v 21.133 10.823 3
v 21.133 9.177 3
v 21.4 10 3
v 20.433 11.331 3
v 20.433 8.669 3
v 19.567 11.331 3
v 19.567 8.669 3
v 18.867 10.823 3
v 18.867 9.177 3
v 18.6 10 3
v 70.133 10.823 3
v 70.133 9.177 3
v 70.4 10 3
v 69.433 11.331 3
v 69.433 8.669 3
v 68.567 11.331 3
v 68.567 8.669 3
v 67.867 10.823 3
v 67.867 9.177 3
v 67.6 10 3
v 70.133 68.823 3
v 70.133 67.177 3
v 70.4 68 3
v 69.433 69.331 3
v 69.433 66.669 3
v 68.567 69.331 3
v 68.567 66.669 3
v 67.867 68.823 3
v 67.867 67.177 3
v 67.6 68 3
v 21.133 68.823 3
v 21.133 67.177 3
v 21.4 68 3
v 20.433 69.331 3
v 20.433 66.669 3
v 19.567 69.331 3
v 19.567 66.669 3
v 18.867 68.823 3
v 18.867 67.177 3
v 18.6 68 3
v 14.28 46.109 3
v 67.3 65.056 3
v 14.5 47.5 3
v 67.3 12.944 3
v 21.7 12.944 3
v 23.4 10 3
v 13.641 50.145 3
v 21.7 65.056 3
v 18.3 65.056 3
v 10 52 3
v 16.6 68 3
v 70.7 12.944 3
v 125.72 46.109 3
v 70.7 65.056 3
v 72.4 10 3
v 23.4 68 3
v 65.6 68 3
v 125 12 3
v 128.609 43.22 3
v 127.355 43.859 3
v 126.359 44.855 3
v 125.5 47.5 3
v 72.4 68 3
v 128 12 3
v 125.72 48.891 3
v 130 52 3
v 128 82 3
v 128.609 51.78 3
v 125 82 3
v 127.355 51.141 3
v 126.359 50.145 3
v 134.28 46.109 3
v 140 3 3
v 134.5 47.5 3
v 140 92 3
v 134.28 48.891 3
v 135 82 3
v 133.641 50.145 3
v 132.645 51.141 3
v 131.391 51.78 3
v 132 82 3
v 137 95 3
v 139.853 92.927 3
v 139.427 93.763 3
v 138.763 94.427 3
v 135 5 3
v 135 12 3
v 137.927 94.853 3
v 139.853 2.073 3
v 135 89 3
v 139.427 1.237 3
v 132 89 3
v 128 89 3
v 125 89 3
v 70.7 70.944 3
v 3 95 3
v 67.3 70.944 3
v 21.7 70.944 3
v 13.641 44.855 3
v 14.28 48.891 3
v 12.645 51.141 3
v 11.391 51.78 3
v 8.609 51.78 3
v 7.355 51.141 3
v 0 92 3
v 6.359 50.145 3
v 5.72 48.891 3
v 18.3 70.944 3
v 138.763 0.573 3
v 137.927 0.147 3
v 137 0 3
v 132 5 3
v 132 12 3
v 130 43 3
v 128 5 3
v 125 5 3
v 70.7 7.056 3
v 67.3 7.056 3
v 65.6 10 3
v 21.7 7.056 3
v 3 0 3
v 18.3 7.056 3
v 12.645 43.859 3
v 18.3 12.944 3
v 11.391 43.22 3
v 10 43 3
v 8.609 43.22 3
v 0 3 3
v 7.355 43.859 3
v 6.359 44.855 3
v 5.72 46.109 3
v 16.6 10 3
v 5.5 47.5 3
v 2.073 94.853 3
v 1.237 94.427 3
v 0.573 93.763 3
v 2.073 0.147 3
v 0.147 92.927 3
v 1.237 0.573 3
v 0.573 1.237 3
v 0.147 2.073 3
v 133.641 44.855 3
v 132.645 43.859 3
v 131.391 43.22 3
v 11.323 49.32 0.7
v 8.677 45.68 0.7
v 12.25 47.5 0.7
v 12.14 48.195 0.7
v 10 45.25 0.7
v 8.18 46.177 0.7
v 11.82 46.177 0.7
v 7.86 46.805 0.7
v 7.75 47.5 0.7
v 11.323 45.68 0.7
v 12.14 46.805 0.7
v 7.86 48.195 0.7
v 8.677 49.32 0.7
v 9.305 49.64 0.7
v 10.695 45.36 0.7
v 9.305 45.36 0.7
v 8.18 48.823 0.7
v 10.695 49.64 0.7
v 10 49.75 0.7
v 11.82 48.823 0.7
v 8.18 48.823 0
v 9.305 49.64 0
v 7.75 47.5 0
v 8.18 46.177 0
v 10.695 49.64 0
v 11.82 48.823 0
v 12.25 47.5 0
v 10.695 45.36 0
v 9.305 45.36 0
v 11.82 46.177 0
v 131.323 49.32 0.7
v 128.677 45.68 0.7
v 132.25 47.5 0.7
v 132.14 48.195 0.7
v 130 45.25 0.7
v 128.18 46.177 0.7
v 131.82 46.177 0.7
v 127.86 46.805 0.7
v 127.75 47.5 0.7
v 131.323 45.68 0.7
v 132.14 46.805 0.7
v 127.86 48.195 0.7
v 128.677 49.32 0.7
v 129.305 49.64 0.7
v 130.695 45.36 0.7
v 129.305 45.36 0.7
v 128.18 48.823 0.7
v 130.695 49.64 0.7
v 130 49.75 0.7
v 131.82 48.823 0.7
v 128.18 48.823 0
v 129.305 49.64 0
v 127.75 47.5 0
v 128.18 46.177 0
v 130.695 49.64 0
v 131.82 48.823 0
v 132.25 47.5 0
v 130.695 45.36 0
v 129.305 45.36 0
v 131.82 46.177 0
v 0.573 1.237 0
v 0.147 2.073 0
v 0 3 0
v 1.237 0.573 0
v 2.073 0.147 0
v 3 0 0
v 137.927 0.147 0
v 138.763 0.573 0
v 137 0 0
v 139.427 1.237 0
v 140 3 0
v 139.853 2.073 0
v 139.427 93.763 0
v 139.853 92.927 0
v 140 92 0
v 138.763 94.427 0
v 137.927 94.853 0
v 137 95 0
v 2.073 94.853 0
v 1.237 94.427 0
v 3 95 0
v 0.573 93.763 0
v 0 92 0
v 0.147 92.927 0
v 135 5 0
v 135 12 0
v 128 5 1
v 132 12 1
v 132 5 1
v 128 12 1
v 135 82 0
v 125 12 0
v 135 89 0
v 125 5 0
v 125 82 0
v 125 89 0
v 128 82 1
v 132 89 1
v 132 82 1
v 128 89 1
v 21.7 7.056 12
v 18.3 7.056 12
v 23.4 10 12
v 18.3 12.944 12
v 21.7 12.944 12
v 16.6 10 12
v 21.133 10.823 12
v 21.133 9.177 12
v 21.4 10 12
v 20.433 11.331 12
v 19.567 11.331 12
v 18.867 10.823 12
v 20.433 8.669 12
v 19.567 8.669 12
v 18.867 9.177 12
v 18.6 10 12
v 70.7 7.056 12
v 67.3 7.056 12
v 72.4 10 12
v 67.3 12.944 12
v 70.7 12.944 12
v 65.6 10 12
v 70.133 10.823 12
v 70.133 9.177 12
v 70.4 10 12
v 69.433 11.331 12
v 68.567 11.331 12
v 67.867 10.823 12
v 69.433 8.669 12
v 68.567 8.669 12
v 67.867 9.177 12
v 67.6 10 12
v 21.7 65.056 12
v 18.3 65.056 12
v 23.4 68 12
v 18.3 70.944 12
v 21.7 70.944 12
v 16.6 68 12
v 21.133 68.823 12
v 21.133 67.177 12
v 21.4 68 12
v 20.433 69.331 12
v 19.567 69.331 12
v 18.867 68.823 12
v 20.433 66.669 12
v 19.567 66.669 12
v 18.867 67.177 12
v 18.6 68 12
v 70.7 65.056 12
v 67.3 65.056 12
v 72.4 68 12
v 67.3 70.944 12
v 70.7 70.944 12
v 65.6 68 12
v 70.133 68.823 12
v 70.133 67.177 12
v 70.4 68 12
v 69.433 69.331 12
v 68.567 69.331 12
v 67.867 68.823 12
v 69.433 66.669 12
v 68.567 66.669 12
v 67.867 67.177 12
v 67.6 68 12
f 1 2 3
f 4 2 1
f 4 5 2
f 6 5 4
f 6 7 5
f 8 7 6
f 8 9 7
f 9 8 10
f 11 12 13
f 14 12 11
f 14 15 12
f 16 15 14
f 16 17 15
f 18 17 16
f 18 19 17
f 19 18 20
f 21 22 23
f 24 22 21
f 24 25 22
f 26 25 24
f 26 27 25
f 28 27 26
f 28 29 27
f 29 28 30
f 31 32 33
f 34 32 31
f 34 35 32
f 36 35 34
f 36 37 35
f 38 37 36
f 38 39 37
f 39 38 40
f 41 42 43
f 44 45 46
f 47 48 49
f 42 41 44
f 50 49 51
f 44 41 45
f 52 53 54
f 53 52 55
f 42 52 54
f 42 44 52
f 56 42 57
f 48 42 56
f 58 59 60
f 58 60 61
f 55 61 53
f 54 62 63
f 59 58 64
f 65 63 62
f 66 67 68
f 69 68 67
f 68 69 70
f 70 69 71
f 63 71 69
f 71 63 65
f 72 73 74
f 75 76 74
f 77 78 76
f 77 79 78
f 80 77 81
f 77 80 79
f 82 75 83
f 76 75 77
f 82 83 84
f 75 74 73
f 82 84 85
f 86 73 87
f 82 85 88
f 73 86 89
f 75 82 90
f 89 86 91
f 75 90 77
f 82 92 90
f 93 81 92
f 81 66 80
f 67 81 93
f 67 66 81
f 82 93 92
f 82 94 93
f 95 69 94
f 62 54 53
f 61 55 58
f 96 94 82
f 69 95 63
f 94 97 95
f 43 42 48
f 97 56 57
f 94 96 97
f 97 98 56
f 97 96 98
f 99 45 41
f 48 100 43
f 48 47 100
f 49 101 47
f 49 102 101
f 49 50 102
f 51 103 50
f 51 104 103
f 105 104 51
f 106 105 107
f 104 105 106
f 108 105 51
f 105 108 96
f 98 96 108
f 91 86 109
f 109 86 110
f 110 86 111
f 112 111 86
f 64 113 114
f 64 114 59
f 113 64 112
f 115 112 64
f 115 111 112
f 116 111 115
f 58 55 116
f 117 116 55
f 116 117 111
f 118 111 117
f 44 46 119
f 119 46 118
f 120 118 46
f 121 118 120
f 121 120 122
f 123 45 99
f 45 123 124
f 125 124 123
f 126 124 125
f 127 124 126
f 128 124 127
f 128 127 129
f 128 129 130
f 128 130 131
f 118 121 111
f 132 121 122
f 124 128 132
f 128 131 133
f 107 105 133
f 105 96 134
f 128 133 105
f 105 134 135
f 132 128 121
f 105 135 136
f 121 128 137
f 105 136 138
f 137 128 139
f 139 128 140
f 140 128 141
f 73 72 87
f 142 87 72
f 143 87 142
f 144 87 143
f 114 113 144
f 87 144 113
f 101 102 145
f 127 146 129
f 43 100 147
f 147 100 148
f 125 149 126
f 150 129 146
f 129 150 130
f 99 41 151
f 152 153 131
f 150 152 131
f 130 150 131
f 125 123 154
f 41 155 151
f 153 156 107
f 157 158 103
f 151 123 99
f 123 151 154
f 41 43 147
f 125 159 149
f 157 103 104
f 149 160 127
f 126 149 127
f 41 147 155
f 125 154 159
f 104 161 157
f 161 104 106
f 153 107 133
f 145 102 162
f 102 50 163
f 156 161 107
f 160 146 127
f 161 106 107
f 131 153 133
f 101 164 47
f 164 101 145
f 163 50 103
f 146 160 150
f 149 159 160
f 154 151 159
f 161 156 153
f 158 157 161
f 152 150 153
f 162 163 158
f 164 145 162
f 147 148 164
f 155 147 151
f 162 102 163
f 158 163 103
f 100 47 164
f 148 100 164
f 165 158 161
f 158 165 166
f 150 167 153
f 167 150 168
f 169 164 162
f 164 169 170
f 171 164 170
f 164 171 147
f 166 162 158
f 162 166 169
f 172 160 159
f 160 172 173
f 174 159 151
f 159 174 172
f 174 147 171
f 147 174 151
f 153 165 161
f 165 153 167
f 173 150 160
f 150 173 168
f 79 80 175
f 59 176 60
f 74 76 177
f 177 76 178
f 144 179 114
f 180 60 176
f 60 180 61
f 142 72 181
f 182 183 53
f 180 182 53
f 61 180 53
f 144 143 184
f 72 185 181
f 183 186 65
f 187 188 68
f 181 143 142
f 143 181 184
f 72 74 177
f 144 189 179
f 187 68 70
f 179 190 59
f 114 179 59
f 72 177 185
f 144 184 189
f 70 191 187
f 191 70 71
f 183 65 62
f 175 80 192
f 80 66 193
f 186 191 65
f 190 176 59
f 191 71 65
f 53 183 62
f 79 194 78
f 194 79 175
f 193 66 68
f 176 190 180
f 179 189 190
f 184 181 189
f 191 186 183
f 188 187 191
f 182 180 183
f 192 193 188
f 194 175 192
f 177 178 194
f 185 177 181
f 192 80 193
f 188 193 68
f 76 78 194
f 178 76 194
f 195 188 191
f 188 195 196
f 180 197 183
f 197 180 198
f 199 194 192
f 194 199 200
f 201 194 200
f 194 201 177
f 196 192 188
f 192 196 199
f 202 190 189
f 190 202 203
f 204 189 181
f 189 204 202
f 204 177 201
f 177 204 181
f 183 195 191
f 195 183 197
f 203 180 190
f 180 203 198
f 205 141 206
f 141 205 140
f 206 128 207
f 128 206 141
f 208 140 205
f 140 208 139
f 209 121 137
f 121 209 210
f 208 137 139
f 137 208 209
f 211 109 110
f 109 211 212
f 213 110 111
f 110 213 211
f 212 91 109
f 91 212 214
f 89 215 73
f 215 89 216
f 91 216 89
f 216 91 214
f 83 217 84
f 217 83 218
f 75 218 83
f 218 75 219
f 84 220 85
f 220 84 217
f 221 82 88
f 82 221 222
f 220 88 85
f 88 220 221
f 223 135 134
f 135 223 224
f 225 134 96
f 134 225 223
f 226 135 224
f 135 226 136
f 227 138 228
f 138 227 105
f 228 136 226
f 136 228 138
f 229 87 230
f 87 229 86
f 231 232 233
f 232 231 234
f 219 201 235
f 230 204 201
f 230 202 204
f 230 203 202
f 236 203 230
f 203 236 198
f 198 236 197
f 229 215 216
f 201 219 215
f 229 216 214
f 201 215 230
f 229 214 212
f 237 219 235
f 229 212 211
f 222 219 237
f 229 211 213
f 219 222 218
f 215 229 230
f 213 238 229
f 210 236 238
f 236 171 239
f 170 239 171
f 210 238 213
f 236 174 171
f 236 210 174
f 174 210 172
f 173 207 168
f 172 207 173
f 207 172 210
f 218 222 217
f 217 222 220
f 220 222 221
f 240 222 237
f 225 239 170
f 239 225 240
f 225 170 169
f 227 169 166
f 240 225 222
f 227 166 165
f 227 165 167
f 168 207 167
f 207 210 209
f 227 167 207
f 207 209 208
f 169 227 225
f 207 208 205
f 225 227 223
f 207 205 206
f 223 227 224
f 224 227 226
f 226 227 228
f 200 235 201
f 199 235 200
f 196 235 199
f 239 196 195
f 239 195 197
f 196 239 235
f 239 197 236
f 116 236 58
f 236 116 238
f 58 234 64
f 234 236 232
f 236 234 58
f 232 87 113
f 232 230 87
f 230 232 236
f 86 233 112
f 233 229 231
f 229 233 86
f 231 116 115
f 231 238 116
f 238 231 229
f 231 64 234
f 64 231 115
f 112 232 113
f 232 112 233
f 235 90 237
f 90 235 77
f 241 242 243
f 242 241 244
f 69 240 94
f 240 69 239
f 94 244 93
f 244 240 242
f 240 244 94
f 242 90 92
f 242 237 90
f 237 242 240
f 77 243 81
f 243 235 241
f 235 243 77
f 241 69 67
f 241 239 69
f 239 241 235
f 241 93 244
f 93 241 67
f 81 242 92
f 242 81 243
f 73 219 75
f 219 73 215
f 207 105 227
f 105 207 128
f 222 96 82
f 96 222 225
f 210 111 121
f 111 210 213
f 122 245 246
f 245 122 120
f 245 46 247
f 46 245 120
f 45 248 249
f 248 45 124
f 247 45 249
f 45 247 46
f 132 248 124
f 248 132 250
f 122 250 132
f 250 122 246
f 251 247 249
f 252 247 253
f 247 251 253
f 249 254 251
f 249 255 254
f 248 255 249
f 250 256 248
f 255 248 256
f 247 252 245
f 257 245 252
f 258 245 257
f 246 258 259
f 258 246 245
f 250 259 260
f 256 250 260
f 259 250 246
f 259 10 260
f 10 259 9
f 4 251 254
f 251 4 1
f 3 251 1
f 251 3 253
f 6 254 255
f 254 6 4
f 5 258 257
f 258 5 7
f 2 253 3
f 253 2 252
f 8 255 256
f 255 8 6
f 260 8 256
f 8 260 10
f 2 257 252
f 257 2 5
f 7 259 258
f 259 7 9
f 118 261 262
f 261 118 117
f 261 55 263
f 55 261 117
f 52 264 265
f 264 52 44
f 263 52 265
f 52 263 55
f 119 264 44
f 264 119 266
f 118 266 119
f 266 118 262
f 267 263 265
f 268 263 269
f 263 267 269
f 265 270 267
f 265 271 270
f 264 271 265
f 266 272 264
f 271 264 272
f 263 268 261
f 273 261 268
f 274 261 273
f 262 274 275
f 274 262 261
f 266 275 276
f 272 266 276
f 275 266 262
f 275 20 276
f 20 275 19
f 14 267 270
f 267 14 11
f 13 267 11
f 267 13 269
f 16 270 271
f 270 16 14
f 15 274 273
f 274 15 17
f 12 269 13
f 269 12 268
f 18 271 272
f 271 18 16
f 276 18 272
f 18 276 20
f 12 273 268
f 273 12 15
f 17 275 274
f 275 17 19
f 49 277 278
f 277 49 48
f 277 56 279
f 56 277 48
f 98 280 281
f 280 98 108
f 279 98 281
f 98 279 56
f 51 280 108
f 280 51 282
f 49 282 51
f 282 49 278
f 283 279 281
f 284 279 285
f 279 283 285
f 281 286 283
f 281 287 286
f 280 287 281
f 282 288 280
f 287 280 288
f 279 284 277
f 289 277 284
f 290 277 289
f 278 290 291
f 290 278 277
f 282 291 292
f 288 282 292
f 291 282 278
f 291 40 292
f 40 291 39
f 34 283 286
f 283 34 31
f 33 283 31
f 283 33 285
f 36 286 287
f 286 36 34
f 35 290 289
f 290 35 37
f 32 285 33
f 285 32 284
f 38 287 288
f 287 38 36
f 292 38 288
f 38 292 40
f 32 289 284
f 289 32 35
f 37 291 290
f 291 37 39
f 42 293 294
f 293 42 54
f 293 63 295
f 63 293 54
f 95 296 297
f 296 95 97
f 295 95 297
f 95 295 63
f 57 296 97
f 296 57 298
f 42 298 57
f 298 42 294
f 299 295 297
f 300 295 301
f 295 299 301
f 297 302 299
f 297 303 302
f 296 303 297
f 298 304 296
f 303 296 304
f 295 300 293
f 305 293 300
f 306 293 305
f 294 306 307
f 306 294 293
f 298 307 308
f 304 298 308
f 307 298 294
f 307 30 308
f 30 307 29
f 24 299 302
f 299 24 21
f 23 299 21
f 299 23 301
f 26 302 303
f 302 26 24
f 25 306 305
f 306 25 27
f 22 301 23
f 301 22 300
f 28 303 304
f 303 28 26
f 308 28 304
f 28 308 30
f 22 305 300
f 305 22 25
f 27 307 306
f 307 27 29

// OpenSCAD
/*
 * Raspberry Pi mounting plate with space for a power supply board
 * 
 * 
 * 
 * 
 * 
 * Copyright 2022 Dan Kirshner - dan_kirshner@yahoo.com
 * This program is free software: you can redistribute it and/or modify
 * it under the terms of the GNU General Public License as published by
 * the Free Software Foundation, either version 3 of the License, or
 * (at your option) any later version.
 *
 * This program is distributed in the hope that it will be useful,
 * but WITHOUT ANY WARRANTY; without even the implied warranty of
 * MERCHANTABILITY or FITNESS FOR A PARTICULAR PURPOSE.  See the
 * GNU General Public License for more details.
 *
 * See <http://www.gnu.org/licenses/>.
 *
*/

plateWidth = 140;
plateHeight = 95;
plateThick = 3;
plateCorner = 3;
piHoleX = 49;      //Distance from 1st hole on X
piHoleY = 58;      //Distance from 1st hole on Y
piHoleStartX = 20;
piHoleStartY = 10;
ZipX = plateWidth -15;
ZipY = 5;
ZipY2 = plateHeight- 13;


difference(){
    cube([plateWidth, plateHeight, plateThick]);
    // Remove Left Screw
    translate([10,plateHeight/2,plateThick]) screwHole();
    // Remove Right Screw
    translate([plateWidth-10,plateHeight/2,plateThick]) screwHole();
    // Round bottom left
    translate([0,0,0]) rotate([0,0,0]) fillet(plateCorner,plateThick, $fn=20);
    // Round bottom right
    translate([plateWidth,0,0]) rotate([0,0,90]) fillet(plateCorner,plateThick, $fn=20);
    // Round top right
    translate([plateWidth,plateHeight,0]) rotate([0,0,180]) fillet(plateCorner,plateThick, $fn=20);
    // Round top left
    translate([0,plateHeight,0]) rotate([0,0,270]) fillet(plateCorner,plateThick, $fn=20);
    #translate([ZipX,ZipY,0]) ziptie();
    #translate([ZipX,ZipY2,0]) ziptie();
}

// Standoff bottom left
translate([piHoleStartX, piHoleStartY, plateThick])screwStandoff();
// Standoff bottom right
translate([piHoleStartX + piHoleX, piHoleStartY, plateThick])screwStandoff();
// Standoff top left
translate([piHoleStartX, piHoleStartY + piHoleY, plateThick])screwStandoff();
// Standoff top right
translate([piHoleStartX + piHoleX, piHoleStartY + piHoleY, plateThick])screwStandoff();



module screwHole(){
    screwHole = 4.5;
    screwDepth = 10;
    screwHead = 9;
    headTaper = 2.3;
    screwHeadDepth = 5;
    translate([0,0,-headTaper])cylinder(d1=screwHole, d2=screwHead, h = headTaper, $fn=20);
    translate([0,0,-headTaper-screwDepth])cylinder(d=screwHole, h=screwDepth, $fn=10);
    translate([0,0,-headTaper-screwDepth])cylinder(d=screwHole, h=screwDepth, $fn=10);
    translate([0,0,0]) cylinder(d=screwHead, h=screwHeadDepth, $fn=10);
}

module screwStandoff(){
    holeWidth = 2.8;      //#4 screw = 2.8mm, 
    holeDepth = 9;        //Offset from height
    Height = holeDepth;
    Width = holeWidth + (2*2);
    difference(){
        cylinder(d=Width, h=Height, $fn=6);
        #translate([0,0,Height-holeDepth])cylinder(d=holeWidth, h=holeDepth, $fn=10);
    }
}

module fillet(radius = 1, height = 1){
    translate([radius, radius, -1]) rotate([0,0,180])
        difference(){
            cube([radius + 1, radius + 1, height + 2]);
            #cylinder(r = radius, h = height + 2);
        }
}

module ziptie(){
    zipWidth = 3;
    zipHeight = 7;
    zipSpace = 7;
    zipDepth = 1;
    // Bottom groove
    #translate ([]) cube([zipWidth+zipSpace,zipHeight,zipDepth]);
    // Left ziptie slot
    #translate([0,0,0]) cube([zipWidth,zipHeight,plateThick+1]);
    // Right ziptie slot
    #translate([zipSpace,0,0]) cube([zipWidth,zipHeight,plateThick+1]);
    // Bottom
}
